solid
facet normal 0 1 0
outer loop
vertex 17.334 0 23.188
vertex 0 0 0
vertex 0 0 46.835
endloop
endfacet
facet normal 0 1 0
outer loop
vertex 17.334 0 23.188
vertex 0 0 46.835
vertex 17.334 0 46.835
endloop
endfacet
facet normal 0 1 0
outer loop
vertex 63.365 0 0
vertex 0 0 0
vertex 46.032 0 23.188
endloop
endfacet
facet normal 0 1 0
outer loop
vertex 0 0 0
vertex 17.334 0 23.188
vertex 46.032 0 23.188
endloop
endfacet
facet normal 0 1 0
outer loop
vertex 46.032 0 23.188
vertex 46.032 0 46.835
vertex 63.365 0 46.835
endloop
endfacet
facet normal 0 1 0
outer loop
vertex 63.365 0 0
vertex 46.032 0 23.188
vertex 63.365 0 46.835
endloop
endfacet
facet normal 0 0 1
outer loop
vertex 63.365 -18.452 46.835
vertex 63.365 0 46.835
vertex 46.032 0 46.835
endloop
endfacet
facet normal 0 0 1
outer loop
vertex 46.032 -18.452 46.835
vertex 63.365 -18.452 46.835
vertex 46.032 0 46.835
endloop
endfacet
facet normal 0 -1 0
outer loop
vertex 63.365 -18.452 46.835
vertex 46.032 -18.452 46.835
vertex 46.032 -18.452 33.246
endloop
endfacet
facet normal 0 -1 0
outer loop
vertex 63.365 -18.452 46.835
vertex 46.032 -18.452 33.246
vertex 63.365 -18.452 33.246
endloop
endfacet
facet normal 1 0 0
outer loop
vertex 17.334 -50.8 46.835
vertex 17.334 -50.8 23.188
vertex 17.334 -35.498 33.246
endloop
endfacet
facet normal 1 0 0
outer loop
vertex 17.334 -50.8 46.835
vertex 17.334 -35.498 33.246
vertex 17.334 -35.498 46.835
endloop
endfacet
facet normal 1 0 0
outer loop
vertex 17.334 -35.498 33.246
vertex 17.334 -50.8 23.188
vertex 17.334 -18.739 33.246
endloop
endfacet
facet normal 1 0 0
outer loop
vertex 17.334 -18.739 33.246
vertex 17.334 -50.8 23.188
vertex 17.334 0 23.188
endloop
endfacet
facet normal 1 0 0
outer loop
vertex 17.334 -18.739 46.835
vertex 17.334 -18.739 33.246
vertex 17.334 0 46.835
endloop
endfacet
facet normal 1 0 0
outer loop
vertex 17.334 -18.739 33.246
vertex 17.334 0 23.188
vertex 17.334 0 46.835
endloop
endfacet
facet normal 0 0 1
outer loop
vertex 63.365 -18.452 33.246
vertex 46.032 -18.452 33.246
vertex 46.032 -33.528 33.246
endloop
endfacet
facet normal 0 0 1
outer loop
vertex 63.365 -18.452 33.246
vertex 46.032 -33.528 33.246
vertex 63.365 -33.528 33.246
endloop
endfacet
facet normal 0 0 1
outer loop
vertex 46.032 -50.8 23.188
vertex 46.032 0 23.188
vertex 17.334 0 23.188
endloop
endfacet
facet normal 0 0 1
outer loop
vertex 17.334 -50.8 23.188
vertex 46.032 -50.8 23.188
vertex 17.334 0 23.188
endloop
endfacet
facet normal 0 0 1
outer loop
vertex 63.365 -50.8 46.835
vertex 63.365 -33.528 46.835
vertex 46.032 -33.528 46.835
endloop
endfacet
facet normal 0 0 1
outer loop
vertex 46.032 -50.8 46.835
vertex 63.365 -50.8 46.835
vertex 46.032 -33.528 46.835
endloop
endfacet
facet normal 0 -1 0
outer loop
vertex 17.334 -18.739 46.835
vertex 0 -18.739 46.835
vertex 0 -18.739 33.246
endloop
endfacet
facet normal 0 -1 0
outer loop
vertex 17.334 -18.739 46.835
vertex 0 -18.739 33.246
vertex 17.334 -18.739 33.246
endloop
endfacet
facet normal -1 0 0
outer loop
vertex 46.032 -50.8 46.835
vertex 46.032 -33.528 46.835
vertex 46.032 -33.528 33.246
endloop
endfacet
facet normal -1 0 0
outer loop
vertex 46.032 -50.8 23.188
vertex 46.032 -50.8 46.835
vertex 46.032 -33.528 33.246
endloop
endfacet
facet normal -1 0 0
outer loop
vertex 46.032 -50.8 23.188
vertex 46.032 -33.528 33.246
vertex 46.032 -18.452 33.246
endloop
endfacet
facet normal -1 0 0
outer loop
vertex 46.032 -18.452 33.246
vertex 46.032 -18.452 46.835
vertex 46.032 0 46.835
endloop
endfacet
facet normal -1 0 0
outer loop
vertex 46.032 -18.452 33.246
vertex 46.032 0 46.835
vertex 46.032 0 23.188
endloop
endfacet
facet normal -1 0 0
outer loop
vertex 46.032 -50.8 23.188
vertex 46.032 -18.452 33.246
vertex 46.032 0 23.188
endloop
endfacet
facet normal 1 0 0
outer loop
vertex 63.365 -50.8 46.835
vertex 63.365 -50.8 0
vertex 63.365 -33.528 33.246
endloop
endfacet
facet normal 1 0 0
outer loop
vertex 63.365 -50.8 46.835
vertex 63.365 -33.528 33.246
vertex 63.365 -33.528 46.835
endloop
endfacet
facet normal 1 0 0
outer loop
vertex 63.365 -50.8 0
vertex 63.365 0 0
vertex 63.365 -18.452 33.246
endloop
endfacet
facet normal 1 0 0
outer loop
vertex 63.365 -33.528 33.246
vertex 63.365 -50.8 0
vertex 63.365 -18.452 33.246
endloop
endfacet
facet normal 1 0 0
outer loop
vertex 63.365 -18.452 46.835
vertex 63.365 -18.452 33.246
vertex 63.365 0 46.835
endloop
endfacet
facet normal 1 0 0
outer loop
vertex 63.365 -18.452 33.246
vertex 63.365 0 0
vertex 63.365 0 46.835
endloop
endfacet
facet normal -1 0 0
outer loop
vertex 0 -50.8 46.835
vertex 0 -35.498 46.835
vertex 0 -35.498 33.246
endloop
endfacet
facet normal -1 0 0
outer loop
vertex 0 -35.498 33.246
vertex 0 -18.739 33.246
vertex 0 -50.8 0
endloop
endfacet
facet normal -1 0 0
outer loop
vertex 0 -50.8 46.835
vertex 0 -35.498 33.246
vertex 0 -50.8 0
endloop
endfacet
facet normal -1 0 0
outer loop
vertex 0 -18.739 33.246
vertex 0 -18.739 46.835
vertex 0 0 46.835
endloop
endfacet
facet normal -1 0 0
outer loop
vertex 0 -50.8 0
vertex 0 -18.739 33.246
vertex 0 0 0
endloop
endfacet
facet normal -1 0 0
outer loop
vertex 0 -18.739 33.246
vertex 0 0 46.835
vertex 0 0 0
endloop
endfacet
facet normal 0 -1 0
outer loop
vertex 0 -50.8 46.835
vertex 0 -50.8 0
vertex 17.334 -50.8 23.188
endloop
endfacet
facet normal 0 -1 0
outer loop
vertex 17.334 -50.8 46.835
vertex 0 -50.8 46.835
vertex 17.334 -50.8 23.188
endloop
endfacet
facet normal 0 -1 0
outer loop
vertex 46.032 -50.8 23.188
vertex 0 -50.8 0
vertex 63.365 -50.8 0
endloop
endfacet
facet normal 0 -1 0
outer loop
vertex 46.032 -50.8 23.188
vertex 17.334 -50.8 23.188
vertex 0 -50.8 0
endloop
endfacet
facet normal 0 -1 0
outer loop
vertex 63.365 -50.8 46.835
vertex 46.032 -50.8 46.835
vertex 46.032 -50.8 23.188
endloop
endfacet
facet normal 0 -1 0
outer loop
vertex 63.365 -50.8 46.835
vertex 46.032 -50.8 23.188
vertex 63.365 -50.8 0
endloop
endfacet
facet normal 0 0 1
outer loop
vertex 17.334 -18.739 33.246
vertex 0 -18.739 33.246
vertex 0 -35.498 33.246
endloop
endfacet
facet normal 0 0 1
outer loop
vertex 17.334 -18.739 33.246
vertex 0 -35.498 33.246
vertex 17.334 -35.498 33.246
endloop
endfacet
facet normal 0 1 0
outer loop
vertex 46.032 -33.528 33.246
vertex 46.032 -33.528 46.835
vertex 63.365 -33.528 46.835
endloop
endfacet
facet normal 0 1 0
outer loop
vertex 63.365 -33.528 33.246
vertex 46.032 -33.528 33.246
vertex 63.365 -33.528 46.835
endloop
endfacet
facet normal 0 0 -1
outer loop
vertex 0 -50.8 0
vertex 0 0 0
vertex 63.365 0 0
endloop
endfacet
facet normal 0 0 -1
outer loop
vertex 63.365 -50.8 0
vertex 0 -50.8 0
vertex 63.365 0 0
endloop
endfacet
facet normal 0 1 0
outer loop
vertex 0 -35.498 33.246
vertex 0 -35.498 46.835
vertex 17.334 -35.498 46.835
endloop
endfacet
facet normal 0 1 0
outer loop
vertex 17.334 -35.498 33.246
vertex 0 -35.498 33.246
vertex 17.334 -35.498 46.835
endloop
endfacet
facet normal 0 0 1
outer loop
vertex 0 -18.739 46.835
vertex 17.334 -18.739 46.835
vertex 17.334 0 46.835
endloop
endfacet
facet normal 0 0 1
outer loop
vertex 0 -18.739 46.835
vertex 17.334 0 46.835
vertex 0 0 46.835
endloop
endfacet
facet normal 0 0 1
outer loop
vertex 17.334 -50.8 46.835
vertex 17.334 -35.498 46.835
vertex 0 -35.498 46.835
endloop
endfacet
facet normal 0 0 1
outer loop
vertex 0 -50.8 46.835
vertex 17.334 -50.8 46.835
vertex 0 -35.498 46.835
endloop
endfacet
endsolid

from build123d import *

# Parameters (mm, degrees)
F1_DEPTH = 50.8
F2_W     = 17.3335857689
F2_H     = 15.0761622936
F3_DEPTH = 13.589
F4_W     = 17.3335857689
F4_H     = 16.7590361089
F5_DEPTH = 13.589


with BuildPart() as f1:
    # F0 (on Front) → F1 (new body)
    with BuildSketch(Plane.XZ):
        Polygon((0, 46.8351207674), (0, 0), (63.3651614189, 0), (63.3651614189, 46.8351207674), (46.03157565, 46.8351207674), (46.03157565, 23.1879781932), (17.3335857689, 23.1879781932), (17.3335857689, 46.8351207674), align=None)
    extrude(amount=F1_DEPTH)

    # F2 (on face) → F3 (cut)
    with BuildSketch(Plane.XY.offset(46.8351207674)):
        with Locations((54.6983685344, -25.9903585538)):
            Rectangle(F2_W, F2_H)
    extrude(amount=-F3_DEPTH, mode=Mode.SUBTRACT)

    # F4 (on face) → F5 (cut)
    with BuildSketch(Plane.XY.offset(46.8351207674)):
        with Locations((8.6667928845, -27.1185943857)):
            Rectangle(F4_W, F4_H)
    extrude(amount=-F5_DEPTH, mode=Mode.SUBTRACT)


solid = f1.part
